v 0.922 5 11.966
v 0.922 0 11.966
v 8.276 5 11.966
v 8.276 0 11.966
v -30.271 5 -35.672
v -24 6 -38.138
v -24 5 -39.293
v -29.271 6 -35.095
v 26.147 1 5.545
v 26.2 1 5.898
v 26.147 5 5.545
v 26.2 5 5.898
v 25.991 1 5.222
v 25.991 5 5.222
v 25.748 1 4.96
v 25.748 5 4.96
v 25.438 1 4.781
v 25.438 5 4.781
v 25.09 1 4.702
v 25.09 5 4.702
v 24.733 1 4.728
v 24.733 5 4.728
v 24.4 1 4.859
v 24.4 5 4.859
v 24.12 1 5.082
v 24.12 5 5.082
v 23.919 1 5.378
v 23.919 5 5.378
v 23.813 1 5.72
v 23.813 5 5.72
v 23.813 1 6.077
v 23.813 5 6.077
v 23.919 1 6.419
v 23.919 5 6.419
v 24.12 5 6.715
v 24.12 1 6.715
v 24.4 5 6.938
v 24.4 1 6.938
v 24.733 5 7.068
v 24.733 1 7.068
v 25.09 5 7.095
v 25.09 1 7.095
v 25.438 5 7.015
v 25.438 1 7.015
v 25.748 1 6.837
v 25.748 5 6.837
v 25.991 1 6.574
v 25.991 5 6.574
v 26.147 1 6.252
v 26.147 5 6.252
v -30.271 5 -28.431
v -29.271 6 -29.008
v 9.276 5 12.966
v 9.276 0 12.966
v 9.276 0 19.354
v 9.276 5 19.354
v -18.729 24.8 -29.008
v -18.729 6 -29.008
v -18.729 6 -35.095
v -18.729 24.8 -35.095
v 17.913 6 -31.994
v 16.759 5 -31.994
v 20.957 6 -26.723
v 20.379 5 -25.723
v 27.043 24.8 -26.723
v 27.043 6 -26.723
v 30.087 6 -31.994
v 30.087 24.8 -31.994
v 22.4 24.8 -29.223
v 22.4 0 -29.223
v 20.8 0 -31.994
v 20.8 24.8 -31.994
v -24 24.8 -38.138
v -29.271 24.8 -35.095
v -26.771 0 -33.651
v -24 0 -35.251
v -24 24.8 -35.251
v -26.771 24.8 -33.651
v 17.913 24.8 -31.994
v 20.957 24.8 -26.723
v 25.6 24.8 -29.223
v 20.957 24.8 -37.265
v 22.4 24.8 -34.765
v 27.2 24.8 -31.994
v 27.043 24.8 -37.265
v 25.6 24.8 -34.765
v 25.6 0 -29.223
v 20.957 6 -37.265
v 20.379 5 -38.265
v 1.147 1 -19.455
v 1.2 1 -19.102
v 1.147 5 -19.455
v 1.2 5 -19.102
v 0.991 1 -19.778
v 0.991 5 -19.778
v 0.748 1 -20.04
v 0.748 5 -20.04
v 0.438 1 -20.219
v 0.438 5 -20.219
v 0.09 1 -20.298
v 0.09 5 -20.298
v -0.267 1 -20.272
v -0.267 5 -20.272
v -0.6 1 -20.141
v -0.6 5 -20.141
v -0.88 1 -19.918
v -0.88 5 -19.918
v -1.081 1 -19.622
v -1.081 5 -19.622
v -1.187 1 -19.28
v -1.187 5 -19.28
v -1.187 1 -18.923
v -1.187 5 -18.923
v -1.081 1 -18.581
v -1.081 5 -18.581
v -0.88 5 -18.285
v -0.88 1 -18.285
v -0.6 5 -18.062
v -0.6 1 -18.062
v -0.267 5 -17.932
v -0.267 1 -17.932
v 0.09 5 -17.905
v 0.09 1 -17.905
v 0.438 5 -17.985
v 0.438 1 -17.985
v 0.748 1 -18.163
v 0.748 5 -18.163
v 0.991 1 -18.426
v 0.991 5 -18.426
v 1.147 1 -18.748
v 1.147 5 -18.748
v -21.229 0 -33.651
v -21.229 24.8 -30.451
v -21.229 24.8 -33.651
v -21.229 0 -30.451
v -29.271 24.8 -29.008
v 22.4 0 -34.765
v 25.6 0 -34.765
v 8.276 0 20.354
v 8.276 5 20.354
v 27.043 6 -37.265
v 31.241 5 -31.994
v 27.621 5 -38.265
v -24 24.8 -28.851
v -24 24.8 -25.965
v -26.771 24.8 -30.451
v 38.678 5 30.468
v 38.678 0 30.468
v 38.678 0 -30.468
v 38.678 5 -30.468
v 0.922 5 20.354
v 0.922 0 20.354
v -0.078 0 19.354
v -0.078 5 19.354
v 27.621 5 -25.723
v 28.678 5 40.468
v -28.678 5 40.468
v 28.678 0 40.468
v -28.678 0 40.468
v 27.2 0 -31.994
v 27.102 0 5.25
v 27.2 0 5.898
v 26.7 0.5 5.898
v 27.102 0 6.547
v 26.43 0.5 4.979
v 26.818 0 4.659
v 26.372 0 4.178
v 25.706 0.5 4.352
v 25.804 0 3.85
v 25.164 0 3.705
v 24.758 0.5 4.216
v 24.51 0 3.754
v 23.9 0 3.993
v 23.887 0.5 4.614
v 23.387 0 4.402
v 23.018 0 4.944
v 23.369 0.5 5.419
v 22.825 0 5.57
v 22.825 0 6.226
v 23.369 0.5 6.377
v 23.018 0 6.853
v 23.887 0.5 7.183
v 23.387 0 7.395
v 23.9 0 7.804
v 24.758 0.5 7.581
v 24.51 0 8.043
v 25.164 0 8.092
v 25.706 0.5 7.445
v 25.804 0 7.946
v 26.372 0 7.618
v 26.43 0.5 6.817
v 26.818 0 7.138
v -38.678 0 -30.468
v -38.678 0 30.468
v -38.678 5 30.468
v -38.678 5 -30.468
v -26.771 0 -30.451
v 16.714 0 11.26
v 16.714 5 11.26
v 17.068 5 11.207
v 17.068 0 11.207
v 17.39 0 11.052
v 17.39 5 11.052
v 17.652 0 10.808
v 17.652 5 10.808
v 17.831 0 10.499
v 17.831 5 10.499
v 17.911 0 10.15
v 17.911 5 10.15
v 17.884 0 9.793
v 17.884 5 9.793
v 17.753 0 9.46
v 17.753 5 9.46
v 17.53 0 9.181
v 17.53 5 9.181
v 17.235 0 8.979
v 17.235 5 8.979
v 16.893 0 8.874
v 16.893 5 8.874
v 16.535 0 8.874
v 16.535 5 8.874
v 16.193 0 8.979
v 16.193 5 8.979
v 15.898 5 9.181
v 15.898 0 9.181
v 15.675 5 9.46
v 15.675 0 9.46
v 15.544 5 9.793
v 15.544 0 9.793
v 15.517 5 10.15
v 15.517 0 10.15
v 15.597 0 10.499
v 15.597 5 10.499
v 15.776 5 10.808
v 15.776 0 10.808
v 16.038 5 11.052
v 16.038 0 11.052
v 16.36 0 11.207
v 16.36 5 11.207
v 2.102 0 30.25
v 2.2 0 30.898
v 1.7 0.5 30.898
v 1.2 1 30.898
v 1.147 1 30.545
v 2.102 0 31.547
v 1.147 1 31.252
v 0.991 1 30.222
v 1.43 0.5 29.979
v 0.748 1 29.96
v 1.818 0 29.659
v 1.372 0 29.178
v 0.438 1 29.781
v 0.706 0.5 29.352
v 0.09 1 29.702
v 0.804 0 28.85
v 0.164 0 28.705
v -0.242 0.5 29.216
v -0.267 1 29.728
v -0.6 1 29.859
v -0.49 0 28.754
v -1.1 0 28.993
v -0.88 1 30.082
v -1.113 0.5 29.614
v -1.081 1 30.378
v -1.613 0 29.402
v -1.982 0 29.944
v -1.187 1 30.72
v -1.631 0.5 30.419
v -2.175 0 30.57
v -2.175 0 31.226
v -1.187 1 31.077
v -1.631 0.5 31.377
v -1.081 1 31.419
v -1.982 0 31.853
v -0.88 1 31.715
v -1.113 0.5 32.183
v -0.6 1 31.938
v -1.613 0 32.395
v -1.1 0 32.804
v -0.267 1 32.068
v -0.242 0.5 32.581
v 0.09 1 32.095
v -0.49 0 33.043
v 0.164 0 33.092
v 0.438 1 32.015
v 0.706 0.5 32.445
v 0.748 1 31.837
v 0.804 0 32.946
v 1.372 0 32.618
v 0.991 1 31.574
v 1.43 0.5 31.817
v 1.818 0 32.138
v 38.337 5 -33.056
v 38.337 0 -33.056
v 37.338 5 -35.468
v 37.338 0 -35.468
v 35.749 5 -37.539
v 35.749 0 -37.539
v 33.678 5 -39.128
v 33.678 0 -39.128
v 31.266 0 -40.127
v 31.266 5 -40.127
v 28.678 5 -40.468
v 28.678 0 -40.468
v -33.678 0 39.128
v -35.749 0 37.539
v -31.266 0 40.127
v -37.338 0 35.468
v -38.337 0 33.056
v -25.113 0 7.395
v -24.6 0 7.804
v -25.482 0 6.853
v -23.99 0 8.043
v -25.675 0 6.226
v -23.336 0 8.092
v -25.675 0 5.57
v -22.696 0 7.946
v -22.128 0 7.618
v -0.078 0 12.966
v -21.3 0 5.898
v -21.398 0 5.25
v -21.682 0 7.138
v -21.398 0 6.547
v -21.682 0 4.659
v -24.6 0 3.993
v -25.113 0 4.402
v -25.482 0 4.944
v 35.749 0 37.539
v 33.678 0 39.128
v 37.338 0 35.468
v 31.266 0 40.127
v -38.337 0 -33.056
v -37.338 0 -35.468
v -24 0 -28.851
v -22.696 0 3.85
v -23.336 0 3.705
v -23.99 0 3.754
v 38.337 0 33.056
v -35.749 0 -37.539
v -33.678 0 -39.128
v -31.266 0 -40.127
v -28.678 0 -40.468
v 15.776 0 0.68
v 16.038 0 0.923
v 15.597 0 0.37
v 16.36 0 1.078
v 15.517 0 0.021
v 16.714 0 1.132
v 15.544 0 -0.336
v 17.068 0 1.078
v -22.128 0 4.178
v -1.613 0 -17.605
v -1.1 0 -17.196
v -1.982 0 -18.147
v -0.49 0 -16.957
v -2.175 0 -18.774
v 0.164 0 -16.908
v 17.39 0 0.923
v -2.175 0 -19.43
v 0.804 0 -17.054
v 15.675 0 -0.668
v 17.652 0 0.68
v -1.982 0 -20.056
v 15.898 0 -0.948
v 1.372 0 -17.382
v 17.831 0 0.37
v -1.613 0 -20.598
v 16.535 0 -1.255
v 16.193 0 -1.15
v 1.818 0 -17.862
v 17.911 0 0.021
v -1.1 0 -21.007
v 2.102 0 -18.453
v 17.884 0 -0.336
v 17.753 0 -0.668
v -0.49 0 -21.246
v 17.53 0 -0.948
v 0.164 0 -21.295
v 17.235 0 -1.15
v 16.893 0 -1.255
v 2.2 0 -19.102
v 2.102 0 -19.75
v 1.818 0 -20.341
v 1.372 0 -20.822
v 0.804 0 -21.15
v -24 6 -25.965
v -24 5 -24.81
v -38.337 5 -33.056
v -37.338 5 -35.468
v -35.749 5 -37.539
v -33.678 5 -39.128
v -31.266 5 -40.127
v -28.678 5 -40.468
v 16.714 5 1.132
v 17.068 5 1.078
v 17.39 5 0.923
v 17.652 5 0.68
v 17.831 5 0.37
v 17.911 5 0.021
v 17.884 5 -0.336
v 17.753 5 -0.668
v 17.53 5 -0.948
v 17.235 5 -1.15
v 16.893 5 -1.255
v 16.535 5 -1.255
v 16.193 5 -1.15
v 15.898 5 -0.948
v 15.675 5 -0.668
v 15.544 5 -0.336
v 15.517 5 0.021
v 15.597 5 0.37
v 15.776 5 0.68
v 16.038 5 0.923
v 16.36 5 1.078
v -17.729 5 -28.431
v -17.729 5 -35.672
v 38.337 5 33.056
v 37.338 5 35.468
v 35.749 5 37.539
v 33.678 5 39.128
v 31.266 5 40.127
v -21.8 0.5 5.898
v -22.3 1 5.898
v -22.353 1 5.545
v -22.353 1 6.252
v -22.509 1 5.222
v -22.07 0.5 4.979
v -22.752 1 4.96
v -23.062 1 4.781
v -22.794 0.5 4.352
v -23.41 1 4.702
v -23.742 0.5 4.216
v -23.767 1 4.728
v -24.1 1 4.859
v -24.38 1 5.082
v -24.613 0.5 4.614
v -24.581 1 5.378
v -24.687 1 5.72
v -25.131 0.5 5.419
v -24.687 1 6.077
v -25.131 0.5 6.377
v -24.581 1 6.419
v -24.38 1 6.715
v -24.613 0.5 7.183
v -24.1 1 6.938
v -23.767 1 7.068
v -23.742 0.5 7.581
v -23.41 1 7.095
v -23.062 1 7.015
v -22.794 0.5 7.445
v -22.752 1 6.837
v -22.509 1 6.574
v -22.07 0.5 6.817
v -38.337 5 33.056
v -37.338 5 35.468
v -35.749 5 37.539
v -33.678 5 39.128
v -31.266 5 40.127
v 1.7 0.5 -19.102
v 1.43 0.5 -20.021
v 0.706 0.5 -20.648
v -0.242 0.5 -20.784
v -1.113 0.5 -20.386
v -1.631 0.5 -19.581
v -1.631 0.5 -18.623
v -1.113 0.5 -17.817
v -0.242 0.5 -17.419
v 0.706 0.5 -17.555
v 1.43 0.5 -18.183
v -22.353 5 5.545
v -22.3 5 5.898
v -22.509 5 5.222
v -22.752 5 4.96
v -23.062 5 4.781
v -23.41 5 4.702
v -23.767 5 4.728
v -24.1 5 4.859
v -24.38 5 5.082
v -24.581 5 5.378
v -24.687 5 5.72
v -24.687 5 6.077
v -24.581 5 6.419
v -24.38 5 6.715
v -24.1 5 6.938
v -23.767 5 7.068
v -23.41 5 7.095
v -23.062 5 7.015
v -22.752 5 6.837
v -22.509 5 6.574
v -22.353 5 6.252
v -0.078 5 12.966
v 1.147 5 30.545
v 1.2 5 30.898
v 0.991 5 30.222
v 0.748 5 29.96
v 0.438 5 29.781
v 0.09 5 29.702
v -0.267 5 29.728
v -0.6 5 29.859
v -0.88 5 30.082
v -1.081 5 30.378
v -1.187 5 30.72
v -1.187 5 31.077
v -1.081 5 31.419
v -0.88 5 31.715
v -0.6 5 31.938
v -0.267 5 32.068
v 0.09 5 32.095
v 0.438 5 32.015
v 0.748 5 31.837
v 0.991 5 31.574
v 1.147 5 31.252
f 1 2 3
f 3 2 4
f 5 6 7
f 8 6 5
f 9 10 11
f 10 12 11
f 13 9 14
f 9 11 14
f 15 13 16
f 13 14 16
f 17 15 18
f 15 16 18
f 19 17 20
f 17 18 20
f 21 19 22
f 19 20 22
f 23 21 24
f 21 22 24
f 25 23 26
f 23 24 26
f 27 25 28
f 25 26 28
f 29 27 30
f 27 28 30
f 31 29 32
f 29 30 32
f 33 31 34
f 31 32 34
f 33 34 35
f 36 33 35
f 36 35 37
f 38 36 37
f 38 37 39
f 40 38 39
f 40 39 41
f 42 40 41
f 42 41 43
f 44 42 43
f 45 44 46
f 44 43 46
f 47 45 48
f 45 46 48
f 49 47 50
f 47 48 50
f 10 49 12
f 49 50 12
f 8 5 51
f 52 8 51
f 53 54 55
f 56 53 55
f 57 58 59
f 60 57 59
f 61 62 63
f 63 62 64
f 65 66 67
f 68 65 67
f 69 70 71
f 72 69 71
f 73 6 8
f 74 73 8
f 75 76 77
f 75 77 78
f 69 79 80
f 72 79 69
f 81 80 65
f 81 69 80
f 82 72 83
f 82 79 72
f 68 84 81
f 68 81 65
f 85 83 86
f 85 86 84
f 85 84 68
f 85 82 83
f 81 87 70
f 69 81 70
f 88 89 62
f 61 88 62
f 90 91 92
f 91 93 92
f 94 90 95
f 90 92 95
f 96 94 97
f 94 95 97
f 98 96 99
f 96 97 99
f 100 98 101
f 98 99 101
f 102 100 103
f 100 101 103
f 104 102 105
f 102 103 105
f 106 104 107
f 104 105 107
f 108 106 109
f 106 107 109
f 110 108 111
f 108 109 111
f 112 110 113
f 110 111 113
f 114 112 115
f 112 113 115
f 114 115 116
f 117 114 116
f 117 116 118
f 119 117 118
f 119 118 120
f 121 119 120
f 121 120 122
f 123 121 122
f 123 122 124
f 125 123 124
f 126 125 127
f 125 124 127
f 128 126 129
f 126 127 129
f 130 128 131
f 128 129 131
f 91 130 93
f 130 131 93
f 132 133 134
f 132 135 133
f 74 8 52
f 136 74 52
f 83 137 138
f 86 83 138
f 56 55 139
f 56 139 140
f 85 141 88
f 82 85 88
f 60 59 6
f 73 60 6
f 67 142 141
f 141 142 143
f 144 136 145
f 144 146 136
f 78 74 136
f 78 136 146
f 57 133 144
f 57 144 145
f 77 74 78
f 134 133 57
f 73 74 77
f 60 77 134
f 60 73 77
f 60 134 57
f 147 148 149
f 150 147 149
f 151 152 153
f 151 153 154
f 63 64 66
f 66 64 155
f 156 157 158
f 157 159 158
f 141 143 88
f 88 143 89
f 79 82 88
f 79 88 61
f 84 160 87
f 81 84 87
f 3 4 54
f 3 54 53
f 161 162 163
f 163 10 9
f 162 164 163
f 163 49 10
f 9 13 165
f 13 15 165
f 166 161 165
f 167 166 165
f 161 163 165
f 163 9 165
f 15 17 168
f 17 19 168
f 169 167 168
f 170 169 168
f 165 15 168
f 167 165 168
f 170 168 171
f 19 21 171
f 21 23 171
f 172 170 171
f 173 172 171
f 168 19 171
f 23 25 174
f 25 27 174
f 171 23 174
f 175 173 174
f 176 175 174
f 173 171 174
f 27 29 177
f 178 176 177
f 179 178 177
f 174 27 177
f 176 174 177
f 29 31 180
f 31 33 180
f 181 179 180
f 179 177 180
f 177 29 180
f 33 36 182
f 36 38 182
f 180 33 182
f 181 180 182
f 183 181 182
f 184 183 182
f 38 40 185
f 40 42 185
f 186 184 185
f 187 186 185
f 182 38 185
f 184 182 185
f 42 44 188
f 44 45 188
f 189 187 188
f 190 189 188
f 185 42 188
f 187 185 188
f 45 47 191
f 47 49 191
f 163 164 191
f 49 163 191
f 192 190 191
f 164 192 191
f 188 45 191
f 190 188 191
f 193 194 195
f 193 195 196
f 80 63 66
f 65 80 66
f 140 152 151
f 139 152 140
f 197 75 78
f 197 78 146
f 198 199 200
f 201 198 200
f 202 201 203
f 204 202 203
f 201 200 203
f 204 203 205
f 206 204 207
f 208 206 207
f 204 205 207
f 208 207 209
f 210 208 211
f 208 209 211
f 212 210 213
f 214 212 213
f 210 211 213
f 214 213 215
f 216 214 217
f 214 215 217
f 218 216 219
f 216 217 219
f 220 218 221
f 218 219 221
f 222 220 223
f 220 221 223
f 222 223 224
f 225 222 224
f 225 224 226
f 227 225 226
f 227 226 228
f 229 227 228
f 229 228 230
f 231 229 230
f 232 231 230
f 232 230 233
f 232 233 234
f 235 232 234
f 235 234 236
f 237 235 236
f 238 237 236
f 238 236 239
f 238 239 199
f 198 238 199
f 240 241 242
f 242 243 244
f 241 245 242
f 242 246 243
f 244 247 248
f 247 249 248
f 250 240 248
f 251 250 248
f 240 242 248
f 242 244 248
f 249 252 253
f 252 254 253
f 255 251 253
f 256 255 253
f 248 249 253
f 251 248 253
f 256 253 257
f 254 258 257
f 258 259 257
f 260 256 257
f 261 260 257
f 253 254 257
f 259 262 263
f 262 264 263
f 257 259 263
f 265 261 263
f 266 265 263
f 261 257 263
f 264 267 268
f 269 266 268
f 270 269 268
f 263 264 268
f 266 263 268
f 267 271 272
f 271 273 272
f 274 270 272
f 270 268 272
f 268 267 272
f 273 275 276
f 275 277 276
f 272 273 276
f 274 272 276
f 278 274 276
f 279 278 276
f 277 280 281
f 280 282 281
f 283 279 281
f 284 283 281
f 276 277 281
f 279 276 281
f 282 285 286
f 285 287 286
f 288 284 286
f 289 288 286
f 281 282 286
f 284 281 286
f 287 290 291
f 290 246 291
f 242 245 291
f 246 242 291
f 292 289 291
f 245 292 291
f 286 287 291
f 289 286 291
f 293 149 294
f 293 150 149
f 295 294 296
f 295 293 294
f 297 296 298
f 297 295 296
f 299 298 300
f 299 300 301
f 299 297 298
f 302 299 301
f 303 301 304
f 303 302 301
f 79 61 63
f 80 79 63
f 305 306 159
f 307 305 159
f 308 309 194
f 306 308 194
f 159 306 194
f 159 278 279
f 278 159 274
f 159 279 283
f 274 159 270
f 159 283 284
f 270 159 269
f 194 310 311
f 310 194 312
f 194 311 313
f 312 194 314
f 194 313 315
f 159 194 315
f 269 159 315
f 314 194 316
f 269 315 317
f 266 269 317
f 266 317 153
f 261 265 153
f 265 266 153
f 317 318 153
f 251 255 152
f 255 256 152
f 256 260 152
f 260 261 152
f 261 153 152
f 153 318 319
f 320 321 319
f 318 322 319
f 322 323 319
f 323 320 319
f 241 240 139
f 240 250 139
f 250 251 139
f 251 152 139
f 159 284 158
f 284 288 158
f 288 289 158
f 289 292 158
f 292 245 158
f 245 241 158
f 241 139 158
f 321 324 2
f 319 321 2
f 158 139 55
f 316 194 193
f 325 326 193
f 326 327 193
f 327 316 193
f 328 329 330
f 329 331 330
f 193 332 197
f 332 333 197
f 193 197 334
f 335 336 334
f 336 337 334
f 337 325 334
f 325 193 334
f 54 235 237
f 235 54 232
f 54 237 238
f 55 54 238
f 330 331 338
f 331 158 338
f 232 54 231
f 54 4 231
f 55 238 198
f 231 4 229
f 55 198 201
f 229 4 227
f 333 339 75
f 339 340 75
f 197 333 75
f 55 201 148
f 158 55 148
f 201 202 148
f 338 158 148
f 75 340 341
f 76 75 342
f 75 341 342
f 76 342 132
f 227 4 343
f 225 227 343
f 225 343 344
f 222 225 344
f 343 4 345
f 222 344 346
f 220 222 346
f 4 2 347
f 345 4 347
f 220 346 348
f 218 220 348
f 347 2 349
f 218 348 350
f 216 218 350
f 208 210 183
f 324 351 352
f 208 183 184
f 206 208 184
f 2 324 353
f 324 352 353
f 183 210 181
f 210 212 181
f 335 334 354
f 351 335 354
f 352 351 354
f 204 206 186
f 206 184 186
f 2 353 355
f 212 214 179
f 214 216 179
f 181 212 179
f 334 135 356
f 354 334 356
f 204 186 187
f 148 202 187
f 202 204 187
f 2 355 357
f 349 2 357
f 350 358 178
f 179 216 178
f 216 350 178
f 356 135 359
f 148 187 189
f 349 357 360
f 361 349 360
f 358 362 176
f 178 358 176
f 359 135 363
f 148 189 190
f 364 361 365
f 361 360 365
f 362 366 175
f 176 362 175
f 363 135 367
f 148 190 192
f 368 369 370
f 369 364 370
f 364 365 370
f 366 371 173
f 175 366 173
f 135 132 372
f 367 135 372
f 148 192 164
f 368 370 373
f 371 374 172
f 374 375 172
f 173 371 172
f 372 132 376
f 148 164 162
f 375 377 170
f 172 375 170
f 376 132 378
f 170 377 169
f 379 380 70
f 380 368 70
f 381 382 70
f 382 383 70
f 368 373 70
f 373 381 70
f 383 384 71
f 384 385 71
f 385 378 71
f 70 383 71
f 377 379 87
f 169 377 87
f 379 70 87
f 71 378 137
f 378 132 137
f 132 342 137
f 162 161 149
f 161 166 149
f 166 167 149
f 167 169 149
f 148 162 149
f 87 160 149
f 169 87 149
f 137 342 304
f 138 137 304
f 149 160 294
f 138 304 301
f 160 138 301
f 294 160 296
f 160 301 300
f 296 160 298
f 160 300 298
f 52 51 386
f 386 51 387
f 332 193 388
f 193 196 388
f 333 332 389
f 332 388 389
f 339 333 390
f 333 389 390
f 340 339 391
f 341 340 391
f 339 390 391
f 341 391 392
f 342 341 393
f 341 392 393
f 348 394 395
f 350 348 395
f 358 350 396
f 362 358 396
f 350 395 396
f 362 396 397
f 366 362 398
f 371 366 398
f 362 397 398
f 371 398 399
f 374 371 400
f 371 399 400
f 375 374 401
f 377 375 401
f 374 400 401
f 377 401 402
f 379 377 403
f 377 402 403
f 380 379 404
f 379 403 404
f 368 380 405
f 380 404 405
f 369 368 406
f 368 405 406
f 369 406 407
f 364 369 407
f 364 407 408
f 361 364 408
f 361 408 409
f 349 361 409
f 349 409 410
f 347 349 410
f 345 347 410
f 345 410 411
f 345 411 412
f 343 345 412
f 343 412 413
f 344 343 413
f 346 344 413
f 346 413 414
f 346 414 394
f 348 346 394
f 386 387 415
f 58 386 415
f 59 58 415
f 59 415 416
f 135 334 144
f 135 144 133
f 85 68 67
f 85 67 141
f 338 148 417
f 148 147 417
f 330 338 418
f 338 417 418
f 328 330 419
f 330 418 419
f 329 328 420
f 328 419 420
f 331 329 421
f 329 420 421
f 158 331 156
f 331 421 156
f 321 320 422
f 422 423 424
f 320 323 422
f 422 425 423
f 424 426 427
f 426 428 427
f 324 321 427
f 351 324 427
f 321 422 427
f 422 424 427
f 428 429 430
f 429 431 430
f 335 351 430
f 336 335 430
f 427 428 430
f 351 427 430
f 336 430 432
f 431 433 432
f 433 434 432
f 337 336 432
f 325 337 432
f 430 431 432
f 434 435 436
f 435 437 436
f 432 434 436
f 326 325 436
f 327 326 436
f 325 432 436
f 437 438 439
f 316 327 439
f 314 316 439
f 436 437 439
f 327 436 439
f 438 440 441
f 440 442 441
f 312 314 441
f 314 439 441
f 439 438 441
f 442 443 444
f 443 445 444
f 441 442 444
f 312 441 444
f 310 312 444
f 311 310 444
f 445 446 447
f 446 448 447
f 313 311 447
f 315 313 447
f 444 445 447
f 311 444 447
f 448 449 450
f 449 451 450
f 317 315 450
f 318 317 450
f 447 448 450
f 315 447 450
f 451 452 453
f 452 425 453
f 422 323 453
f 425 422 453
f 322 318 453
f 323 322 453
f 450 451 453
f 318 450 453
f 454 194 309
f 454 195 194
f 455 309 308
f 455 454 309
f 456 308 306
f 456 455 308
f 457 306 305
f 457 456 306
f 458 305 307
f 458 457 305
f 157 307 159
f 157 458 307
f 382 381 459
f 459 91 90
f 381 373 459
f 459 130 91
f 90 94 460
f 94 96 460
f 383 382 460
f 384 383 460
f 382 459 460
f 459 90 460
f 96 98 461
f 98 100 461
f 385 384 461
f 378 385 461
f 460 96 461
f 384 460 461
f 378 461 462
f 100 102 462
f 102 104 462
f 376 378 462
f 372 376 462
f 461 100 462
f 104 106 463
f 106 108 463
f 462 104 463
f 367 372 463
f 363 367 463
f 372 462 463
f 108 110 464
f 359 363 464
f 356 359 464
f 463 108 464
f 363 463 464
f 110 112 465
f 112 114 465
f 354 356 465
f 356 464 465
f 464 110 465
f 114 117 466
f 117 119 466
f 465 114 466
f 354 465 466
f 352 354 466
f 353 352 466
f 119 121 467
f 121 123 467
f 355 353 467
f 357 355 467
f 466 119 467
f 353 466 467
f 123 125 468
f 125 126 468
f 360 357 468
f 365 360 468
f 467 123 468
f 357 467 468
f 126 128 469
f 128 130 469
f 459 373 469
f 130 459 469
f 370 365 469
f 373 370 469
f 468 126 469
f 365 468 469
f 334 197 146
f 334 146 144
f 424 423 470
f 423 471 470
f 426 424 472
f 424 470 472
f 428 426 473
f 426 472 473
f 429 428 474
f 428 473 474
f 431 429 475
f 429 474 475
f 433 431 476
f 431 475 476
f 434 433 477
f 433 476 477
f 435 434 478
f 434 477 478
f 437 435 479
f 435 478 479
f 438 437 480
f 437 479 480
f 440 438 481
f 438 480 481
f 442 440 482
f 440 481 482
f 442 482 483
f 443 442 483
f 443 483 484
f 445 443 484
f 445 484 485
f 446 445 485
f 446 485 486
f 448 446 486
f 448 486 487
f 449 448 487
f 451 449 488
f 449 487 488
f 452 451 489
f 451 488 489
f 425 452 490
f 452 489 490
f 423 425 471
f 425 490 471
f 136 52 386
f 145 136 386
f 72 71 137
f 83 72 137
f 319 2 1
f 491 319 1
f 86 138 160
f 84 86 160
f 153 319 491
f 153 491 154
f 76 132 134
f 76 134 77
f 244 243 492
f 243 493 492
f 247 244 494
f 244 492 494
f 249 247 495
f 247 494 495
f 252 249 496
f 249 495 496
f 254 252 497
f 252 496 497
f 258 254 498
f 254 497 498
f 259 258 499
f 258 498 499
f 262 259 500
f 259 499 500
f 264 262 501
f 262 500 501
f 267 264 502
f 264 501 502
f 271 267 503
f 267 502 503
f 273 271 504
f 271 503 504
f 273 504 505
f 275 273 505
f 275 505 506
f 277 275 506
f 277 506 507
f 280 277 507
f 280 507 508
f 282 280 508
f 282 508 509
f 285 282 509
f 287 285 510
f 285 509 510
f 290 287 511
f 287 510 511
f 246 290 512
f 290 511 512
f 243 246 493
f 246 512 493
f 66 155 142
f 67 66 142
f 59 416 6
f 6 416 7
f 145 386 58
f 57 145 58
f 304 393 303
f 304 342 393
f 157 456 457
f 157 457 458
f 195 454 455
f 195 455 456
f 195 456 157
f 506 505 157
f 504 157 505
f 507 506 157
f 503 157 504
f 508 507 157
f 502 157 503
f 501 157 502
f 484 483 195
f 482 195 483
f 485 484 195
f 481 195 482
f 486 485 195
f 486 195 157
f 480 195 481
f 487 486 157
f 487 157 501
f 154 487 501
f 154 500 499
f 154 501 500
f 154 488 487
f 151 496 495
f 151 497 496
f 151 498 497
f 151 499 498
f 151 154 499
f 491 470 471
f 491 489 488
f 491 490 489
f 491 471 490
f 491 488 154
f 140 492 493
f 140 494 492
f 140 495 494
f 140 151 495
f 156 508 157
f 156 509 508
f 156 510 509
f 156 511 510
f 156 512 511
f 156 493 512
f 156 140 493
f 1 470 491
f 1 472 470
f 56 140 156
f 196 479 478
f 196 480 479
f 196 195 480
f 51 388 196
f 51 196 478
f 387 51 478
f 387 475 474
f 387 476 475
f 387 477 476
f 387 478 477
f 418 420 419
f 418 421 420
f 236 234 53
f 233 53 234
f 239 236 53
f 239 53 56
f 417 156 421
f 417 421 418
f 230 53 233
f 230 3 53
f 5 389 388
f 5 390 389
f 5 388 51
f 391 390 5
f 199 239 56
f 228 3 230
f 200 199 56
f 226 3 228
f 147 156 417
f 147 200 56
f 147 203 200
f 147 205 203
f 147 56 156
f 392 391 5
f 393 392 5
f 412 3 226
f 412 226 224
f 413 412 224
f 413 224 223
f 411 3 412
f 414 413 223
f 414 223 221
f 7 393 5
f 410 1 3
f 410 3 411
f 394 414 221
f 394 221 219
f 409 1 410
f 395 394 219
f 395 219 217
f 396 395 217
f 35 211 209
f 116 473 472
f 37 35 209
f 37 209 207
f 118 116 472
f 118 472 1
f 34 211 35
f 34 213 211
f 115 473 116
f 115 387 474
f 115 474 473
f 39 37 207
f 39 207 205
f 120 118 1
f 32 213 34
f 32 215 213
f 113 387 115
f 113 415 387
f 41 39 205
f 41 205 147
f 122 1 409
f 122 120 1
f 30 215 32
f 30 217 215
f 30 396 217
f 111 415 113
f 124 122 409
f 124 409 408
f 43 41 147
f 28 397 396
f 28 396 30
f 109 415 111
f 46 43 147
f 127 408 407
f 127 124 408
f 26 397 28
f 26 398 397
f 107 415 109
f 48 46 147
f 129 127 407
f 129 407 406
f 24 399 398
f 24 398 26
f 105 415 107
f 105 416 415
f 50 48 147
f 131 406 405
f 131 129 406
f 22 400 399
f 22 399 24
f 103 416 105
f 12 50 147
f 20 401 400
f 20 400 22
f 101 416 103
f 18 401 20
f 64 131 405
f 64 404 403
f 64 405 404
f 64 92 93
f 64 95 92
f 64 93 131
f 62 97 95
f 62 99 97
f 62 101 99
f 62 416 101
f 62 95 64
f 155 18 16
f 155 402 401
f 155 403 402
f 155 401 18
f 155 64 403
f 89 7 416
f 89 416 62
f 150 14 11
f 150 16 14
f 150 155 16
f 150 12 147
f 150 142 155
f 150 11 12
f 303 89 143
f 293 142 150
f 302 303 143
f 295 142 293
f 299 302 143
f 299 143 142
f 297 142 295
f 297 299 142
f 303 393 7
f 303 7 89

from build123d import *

# Parameters (mm, degrees)
SKETCH1_W                                       = 38.677516632
SKETCH1_H                                       = 80.9364214
BOSS_EXTRUDE1_DEPTH                             = 5
FILLET1_R                                       = 10
BOSS_EXTRUDE2_DEPTH                             = 19.8
CHAMFER1_SIZE                                   = 1
CSK_FOR_M2_FLAT_HEAD_MACHINE_SCREW1_D           = 2.4
CSK_FOR_M2_FLAT_HEAD_MACHINE_SCREW1_CSINK_D     = 4.4
CSK_FOR_M2_FLAT_HEAD_MACHINE_SCREW1_CSINK_ANGLE = 90
CUT_EXTRUDE3_REACH                              = 63.226
SKETCH12_W                                      = 9.354156198
SKETCH12_H                                      = 8.387423898
CHAMFER3_SIZE                                   = 1
SKETCH15_R                                      = 1.2
CUT_EXTRUDE4_DEPTH                              = 10


with BuildPart() as part:
    # Sketch1 → Boss-Extrude1 (new body)
    # profile 1 of 2: a face of its own
    with BuildSketch(Plane(origin=(0, 0, 0), x_dir=(1, 0, 0), z_dir=(0, 1, 0))):
        with Locations((19.338758316, 0)):
            Rectangle(SKETCH1_W, SKETCH1_H)
        Polygon((25.6, 34.765367903), (27.2, 31.994086611), (25.6, 29.222805318), (22.4, 29.222805318), (20.8, 31.994086611), (22.4, 34.765367903), align=None, mode=Mode.SUBTRACT)
    # profile 2 of 2: a face of its own
    with BuildSketch(Plane(origin=(0, 0, 0), x_dir=(1, 0, 0), z_dir=(0, 1, 0))):
        with Locations((-19.338758316, 0)):
            Rectangle(SKETCH1_W, SKETCH1_H)
        Polygon((-24, 35.251299163), (-21.228718708, 33.651299163), (-21.228718708, 30.451299163), (-24, 28.851299163), (-26.771281292, 30.451299163), (-26.771281292, 33.651299163), align=None, mode=Mode.SUBTRACT)
    extrude(amount=BOSS_EXTRUDE1_DEPTH)

    # Fillet1
    fillet1_edges = [part.edges().sort_by_distance(p)[0] for p in [
        (-38.677516632, 2.5, 40.4682107),
        (-38.677516632, 2.5, -40.4682107),
        (38.677516632, 2.5, -40.4682107),
        (38.677516632, 2.5, 40.4682107),
    ]]
    fillet(fillet1_edges, radius=FILLET1_R)

    # Sketch7 → Boss-Extrude2 (add)
    # profile 1 of 2: a face of its own
    with BuildSketch(Plane(origin=(0, 5, 0), x_dir=(1, 0, 0), z_dir=(0, 1, 0))):
        Polygon((-18.728718708, 35.094674836), (-24, 38.138050509), (-29.271281292, 35.094674836), (-29.271281292, 29.00792349), (-24, 25.964547817), (-18.728718708, 29.00792349), align=None)
        Polygon((-21.228718708, 30.451299163), (-21.228718708, 33.651299163), (-24, 35.251299163), (-26.771281292, 33.651299163), (-26.771281292, 30.451299163), (-24, 28.851299163), align=None, mode=Mode.SUBTRACT)
    # profile 2 of 2: a face of its own
    with BuildSketch(Plane(origin=(0, 5, 0), x_dir=(1, 0, 0), z_dir=(0, 1, 0))):
        Polygon((27.043375673, 37.265367903), (20.956624327, 37.265367903), (17.913248654, 31.994086611), (20.956624327, 26.722805318), (27.043375673, 26.722805318), (30.086751346, 31.994086611), align=None)
        Polygon((25.6, 34.765367903), (22.4, 34.765367903), (20.8, 31.994086611), (22.4, 29.222805318), (25.6, 29.222805318), (27.2, 31.994086611), align=None, mode=Mode.SUBTRACT)
    extrude(amount=BOSS_EXTRUDE2_DEPTH)

    # Chamfer1
    chamfer1_edges = [part.edges().sort_by_distance(p)[0] for p in [
        (-18.728718708, 5, -32.051299163),
        (-21.364359354, 5, -36.616362672),
        (-26.635640646, 5, -36.616362672),
        (-29.271281292, 5, -32.051299163),
        (-26.635640646, 5, -27.486235653),
        (-21.364359354, 5, -27.486235653),
        (28.565063509, 5, -34.629727257),
        (24, 5, -37.265367903),
        (19.434936491, 5, -34.629727257),
        (19.434936491, 5, -29.358445964),
        (24, 5, -26.722805318),
        (28.565063509, 5, -29.358445964),
    ]]
    chamfer(chamfer1_edges, length=CHAMFER1_SIZE)

    # CSK for M2 Flat Head Machine Screw1 (through all)
    with Locations(Plane(origin=(0, 0, 0), x_dir=(-1, 0, 0), z_dir=(0, -1, 0))):
        with Locations((-25, -5.898372583), (0, -30.898372583), (23.5, -5.898372583), (0, 19.101627417)):
            CounterSinkHole(CSK_FOR_M2_FLAT_HEAD_MACHINE_SCREW1_D / 2, CSK_FOR_M2_FLAT_HEAD_MACHINE_SCREW1_CSINK_D / 2, counter_sink_angle=CSK_FOR_M2_FLAT_HEAD_MACHINE_SCREW1_CSINK_ANGLE)

    # Sketch12 → Cut-Extrude3 (cut, up to next)
    with BuildSketch(Plane.XZ, mode=Mode.PRIVATE) as cut_extrude3_sk1:
        with Locations((4.598685832, 16.15981243)):
            Rectangle(SKETCH12_W, SKETCH12_H)
    cut_extrude3_tool1 = extrude(cut_extrude3_sk1.sketch, amount=-CUT_EXTRUDE3_REACH, mode=Mode.PRIVATE) & part.part
    add(cut_extrude3_tool1.solids().sort_by_distance((4.598686, 0, 16.159812))[0], mode=Mode.SUBTRACT)

    # Chamfer3
    chamfer3_edges = [part.edges().sort_by_distance(p)[0] for p in [
        (9.275763931, 2.5, 20.353524379),
        (9.275763931, 2.5, 11.966100481),
        (-0.078392267, 2.5, 11.966100481),
        (-0.078392267, 2.5, 20.353524379),
    ]]
    chamfer(chamfer3_edges, length=CHAMFER3_SIZE)

    # Sketch15 → Cut-Extrude4 (cut)
    with BuildSketch(Plane(origin=(0, 5, 0), x_dir=(1, 0, 0), z_dir=(0, 1, 0))):
        with Locations(Location((16.71400844, -10.060201476, 0), (0, 0, 270))):
            Circle(SKETCH15_R)
        with Locations(Location((16.71400844, 0.06847889, 0), (0, 0, 270))):
            Circle(SKETCH15_R)
    extrude(amount=-CUT_EXTRUDE4_DEPTH, mode=Mode.SUBTRACT)


solid = part.part
